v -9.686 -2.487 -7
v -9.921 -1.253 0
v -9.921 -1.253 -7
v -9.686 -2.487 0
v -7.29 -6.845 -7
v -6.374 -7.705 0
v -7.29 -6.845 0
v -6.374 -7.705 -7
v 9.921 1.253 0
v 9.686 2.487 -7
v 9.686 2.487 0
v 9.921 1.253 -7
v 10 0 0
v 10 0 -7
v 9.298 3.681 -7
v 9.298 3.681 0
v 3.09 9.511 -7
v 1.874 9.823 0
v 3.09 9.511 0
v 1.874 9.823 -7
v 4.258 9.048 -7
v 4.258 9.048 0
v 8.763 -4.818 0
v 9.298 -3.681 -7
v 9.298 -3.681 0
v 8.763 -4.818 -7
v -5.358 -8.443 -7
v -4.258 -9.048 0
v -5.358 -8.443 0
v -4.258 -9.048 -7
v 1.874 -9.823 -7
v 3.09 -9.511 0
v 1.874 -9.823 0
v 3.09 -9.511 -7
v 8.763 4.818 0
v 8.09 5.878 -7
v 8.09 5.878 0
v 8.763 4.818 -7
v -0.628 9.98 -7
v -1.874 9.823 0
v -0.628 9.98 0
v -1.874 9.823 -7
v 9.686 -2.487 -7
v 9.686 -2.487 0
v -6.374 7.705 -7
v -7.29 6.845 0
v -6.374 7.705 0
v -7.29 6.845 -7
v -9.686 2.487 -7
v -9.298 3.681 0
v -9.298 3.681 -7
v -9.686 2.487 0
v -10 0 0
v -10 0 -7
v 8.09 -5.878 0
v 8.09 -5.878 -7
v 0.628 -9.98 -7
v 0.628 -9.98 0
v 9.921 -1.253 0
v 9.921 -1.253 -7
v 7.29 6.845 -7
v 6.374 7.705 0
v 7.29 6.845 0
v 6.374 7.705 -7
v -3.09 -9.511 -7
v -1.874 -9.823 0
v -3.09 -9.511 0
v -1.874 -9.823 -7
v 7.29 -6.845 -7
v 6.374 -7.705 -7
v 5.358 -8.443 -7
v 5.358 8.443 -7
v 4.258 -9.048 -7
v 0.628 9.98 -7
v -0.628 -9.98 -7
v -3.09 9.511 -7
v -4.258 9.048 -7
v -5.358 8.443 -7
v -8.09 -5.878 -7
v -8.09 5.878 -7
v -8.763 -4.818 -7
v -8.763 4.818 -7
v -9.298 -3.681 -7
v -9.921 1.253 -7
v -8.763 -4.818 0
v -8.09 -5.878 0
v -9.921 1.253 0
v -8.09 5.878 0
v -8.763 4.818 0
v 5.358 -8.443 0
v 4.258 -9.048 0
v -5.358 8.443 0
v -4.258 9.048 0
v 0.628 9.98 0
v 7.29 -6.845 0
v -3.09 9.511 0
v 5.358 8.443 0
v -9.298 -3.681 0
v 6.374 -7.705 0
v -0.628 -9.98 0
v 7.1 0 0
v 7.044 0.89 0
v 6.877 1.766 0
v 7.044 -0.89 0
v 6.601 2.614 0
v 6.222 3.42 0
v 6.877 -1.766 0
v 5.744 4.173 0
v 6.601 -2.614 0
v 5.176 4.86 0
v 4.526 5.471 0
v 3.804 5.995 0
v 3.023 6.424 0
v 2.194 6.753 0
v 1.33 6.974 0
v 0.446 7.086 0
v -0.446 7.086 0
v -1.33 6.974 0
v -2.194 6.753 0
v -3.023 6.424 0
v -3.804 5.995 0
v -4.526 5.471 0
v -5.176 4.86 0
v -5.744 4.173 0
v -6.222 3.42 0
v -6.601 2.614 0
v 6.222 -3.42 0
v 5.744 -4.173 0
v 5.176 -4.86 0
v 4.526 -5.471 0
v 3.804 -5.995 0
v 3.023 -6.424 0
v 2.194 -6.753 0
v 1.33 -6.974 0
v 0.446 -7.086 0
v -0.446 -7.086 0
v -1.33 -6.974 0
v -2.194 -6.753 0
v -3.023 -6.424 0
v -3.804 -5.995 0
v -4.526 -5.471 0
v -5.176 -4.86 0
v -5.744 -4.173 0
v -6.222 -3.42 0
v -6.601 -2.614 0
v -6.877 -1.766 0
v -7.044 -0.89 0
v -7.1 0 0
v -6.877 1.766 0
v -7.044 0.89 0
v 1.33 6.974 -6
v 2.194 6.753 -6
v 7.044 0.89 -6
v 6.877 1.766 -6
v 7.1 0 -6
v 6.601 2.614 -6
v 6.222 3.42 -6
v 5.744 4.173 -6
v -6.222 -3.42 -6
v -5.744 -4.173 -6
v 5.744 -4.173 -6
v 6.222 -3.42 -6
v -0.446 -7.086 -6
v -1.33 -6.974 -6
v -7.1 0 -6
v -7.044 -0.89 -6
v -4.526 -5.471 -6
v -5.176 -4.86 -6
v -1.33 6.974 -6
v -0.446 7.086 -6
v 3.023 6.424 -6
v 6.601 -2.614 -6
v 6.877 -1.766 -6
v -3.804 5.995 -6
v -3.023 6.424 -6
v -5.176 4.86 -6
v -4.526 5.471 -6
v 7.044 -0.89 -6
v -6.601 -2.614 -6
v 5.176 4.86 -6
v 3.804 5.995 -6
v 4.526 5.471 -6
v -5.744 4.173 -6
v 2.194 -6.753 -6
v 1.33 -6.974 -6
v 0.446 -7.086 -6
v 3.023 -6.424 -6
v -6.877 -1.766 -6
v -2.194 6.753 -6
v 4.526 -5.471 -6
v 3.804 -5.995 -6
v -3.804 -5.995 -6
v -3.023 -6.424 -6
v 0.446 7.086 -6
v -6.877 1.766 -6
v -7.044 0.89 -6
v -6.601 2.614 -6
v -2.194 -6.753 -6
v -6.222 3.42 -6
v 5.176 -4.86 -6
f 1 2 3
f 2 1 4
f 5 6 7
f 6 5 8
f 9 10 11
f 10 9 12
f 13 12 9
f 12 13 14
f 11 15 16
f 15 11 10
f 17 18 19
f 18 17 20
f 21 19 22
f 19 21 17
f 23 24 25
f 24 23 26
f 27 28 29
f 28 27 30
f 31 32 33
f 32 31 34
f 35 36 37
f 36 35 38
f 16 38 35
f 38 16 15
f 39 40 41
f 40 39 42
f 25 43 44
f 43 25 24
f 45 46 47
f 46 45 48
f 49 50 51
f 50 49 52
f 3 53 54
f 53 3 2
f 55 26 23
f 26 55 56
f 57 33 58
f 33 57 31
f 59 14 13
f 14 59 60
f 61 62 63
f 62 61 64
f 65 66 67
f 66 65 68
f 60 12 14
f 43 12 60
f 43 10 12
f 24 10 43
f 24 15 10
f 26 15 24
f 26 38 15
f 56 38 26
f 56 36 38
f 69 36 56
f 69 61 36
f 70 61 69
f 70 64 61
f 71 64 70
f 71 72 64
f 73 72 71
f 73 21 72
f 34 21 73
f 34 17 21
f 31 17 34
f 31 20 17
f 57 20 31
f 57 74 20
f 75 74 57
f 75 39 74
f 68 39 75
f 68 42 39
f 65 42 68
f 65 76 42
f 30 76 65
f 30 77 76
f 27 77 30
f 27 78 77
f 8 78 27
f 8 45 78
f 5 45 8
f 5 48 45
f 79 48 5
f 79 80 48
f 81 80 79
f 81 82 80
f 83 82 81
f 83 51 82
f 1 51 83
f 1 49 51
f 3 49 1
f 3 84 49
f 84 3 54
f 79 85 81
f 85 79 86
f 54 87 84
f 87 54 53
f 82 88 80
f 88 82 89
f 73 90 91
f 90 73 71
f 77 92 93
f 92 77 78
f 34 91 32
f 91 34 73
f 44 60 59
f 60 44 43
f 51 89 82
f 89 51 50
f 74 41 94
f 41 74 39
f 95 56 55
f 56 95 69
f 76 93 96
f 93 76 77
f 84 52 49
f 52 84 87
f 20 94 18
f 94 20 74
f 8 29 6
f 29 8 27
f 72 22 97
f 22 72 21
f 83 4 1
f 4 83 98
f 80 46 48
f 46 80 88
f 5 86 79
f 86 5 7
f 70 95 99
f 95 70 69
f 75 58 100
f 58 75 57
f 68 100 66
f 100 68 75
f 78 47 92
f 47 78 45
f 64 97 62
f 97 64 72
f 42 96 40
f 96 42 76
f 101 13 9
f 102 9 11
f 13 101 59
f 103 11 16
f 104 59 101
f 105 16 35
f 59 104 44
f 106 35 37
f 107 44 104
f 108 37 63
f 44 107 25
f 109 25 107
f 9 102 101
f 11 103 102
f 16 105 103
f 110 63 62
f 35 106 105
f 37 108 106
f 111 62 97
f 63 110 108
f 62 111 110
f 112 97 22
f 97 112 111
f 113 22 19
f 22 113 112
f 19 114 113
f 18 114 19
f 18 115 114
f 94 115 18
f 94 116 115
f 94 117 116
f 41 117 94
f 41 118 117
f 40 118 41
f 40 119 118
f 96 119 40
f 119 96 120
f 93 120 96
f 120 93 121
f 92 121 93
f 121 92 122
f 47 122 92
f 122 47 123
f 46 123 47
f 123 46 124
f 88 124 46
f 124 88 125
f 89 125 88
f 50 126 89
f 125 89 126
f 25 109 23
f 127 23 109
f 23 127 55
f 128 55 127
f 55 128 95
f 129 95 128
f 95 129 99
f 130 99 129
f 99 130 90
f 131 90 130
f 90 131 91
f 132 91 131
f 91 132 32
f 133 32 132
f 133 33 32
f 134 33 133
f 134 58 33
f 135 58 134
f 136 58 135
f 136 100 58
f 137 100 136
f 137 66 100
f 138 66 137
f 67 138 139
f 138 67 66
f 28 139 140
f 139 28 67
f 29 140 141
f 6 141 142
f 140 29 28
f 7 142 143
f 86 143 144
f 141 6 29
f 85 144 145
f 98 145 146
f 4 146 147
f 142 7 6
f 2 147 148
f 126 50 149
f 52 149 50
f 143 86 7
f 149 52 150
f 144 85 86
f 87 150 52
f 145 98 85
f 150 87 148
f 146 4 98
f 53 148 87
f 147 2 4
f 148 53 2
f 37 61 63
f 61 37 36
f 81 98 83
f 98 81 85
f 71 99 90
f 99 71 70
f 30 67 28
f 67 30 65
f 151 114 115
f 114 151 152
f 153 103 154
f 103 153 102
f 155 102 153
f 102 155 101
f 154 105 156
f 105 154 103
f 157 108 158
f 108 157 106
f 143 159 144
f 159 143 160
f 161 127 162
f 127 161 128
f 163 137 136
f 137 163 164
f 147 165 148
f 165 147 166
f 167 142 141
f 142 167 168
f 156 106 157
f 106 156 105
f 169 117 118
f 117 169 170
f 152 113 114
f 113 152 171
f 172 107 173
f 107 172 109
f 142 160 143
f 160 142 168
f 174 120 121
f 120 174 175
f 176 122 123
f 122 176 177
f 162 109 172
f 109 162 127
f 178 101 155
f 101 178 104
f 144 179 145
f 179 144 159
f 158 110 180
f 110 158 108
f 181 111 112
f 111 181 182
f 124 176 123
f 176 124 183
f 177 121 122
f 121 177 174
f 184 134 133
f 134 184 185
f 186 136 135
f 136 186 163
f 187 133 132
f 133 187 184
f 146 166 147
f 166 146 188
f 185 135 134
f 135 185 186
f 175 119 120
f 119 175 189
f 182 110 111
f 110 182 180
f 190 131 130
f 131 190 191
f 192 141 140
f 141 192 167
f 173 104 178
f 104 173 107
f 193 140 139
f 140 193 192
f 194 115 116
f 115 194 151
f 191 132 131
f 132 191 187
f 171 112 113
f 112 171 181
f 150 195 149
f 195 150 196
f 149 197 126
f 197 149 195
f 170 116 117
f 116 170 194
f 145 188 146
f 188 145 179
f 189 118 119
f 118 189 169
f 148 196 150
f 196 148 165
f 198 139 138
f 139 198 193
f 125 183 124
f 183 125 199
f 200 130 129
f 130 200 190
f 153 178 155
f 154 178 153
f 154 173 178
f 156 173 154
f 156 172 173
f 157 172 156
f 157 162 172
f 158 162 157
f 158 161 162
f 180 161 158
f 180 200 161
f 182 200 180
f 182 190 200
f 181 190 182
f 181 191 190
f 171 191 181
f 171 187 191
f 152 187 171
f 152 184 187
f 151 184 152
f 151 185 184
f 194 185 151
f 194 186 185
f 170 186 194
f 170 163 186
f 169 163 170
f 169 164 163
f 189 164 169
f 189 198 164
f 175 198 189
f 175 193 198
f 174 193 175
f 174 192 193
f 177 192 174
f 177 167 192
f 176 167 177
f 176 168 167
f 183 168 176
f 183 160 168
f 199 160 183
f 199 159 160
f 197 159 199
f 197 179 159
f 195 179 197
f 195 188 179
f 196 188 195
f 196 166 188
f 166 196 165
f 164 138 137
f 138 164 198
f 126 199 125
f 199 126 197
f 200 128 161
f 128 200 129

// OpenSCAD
$fn = 50;


difference() {
	union() {
		translate(v = [0, 0, -7.0000000000]) {
			cylinder(h = 7, r = 10.0000000000);
		}
	}
	union() {
		#translate(v = [0, 0, -6.0000000000]) {
			cylinder(h = 6, r = 7.1000000000);
		}
	}
}
